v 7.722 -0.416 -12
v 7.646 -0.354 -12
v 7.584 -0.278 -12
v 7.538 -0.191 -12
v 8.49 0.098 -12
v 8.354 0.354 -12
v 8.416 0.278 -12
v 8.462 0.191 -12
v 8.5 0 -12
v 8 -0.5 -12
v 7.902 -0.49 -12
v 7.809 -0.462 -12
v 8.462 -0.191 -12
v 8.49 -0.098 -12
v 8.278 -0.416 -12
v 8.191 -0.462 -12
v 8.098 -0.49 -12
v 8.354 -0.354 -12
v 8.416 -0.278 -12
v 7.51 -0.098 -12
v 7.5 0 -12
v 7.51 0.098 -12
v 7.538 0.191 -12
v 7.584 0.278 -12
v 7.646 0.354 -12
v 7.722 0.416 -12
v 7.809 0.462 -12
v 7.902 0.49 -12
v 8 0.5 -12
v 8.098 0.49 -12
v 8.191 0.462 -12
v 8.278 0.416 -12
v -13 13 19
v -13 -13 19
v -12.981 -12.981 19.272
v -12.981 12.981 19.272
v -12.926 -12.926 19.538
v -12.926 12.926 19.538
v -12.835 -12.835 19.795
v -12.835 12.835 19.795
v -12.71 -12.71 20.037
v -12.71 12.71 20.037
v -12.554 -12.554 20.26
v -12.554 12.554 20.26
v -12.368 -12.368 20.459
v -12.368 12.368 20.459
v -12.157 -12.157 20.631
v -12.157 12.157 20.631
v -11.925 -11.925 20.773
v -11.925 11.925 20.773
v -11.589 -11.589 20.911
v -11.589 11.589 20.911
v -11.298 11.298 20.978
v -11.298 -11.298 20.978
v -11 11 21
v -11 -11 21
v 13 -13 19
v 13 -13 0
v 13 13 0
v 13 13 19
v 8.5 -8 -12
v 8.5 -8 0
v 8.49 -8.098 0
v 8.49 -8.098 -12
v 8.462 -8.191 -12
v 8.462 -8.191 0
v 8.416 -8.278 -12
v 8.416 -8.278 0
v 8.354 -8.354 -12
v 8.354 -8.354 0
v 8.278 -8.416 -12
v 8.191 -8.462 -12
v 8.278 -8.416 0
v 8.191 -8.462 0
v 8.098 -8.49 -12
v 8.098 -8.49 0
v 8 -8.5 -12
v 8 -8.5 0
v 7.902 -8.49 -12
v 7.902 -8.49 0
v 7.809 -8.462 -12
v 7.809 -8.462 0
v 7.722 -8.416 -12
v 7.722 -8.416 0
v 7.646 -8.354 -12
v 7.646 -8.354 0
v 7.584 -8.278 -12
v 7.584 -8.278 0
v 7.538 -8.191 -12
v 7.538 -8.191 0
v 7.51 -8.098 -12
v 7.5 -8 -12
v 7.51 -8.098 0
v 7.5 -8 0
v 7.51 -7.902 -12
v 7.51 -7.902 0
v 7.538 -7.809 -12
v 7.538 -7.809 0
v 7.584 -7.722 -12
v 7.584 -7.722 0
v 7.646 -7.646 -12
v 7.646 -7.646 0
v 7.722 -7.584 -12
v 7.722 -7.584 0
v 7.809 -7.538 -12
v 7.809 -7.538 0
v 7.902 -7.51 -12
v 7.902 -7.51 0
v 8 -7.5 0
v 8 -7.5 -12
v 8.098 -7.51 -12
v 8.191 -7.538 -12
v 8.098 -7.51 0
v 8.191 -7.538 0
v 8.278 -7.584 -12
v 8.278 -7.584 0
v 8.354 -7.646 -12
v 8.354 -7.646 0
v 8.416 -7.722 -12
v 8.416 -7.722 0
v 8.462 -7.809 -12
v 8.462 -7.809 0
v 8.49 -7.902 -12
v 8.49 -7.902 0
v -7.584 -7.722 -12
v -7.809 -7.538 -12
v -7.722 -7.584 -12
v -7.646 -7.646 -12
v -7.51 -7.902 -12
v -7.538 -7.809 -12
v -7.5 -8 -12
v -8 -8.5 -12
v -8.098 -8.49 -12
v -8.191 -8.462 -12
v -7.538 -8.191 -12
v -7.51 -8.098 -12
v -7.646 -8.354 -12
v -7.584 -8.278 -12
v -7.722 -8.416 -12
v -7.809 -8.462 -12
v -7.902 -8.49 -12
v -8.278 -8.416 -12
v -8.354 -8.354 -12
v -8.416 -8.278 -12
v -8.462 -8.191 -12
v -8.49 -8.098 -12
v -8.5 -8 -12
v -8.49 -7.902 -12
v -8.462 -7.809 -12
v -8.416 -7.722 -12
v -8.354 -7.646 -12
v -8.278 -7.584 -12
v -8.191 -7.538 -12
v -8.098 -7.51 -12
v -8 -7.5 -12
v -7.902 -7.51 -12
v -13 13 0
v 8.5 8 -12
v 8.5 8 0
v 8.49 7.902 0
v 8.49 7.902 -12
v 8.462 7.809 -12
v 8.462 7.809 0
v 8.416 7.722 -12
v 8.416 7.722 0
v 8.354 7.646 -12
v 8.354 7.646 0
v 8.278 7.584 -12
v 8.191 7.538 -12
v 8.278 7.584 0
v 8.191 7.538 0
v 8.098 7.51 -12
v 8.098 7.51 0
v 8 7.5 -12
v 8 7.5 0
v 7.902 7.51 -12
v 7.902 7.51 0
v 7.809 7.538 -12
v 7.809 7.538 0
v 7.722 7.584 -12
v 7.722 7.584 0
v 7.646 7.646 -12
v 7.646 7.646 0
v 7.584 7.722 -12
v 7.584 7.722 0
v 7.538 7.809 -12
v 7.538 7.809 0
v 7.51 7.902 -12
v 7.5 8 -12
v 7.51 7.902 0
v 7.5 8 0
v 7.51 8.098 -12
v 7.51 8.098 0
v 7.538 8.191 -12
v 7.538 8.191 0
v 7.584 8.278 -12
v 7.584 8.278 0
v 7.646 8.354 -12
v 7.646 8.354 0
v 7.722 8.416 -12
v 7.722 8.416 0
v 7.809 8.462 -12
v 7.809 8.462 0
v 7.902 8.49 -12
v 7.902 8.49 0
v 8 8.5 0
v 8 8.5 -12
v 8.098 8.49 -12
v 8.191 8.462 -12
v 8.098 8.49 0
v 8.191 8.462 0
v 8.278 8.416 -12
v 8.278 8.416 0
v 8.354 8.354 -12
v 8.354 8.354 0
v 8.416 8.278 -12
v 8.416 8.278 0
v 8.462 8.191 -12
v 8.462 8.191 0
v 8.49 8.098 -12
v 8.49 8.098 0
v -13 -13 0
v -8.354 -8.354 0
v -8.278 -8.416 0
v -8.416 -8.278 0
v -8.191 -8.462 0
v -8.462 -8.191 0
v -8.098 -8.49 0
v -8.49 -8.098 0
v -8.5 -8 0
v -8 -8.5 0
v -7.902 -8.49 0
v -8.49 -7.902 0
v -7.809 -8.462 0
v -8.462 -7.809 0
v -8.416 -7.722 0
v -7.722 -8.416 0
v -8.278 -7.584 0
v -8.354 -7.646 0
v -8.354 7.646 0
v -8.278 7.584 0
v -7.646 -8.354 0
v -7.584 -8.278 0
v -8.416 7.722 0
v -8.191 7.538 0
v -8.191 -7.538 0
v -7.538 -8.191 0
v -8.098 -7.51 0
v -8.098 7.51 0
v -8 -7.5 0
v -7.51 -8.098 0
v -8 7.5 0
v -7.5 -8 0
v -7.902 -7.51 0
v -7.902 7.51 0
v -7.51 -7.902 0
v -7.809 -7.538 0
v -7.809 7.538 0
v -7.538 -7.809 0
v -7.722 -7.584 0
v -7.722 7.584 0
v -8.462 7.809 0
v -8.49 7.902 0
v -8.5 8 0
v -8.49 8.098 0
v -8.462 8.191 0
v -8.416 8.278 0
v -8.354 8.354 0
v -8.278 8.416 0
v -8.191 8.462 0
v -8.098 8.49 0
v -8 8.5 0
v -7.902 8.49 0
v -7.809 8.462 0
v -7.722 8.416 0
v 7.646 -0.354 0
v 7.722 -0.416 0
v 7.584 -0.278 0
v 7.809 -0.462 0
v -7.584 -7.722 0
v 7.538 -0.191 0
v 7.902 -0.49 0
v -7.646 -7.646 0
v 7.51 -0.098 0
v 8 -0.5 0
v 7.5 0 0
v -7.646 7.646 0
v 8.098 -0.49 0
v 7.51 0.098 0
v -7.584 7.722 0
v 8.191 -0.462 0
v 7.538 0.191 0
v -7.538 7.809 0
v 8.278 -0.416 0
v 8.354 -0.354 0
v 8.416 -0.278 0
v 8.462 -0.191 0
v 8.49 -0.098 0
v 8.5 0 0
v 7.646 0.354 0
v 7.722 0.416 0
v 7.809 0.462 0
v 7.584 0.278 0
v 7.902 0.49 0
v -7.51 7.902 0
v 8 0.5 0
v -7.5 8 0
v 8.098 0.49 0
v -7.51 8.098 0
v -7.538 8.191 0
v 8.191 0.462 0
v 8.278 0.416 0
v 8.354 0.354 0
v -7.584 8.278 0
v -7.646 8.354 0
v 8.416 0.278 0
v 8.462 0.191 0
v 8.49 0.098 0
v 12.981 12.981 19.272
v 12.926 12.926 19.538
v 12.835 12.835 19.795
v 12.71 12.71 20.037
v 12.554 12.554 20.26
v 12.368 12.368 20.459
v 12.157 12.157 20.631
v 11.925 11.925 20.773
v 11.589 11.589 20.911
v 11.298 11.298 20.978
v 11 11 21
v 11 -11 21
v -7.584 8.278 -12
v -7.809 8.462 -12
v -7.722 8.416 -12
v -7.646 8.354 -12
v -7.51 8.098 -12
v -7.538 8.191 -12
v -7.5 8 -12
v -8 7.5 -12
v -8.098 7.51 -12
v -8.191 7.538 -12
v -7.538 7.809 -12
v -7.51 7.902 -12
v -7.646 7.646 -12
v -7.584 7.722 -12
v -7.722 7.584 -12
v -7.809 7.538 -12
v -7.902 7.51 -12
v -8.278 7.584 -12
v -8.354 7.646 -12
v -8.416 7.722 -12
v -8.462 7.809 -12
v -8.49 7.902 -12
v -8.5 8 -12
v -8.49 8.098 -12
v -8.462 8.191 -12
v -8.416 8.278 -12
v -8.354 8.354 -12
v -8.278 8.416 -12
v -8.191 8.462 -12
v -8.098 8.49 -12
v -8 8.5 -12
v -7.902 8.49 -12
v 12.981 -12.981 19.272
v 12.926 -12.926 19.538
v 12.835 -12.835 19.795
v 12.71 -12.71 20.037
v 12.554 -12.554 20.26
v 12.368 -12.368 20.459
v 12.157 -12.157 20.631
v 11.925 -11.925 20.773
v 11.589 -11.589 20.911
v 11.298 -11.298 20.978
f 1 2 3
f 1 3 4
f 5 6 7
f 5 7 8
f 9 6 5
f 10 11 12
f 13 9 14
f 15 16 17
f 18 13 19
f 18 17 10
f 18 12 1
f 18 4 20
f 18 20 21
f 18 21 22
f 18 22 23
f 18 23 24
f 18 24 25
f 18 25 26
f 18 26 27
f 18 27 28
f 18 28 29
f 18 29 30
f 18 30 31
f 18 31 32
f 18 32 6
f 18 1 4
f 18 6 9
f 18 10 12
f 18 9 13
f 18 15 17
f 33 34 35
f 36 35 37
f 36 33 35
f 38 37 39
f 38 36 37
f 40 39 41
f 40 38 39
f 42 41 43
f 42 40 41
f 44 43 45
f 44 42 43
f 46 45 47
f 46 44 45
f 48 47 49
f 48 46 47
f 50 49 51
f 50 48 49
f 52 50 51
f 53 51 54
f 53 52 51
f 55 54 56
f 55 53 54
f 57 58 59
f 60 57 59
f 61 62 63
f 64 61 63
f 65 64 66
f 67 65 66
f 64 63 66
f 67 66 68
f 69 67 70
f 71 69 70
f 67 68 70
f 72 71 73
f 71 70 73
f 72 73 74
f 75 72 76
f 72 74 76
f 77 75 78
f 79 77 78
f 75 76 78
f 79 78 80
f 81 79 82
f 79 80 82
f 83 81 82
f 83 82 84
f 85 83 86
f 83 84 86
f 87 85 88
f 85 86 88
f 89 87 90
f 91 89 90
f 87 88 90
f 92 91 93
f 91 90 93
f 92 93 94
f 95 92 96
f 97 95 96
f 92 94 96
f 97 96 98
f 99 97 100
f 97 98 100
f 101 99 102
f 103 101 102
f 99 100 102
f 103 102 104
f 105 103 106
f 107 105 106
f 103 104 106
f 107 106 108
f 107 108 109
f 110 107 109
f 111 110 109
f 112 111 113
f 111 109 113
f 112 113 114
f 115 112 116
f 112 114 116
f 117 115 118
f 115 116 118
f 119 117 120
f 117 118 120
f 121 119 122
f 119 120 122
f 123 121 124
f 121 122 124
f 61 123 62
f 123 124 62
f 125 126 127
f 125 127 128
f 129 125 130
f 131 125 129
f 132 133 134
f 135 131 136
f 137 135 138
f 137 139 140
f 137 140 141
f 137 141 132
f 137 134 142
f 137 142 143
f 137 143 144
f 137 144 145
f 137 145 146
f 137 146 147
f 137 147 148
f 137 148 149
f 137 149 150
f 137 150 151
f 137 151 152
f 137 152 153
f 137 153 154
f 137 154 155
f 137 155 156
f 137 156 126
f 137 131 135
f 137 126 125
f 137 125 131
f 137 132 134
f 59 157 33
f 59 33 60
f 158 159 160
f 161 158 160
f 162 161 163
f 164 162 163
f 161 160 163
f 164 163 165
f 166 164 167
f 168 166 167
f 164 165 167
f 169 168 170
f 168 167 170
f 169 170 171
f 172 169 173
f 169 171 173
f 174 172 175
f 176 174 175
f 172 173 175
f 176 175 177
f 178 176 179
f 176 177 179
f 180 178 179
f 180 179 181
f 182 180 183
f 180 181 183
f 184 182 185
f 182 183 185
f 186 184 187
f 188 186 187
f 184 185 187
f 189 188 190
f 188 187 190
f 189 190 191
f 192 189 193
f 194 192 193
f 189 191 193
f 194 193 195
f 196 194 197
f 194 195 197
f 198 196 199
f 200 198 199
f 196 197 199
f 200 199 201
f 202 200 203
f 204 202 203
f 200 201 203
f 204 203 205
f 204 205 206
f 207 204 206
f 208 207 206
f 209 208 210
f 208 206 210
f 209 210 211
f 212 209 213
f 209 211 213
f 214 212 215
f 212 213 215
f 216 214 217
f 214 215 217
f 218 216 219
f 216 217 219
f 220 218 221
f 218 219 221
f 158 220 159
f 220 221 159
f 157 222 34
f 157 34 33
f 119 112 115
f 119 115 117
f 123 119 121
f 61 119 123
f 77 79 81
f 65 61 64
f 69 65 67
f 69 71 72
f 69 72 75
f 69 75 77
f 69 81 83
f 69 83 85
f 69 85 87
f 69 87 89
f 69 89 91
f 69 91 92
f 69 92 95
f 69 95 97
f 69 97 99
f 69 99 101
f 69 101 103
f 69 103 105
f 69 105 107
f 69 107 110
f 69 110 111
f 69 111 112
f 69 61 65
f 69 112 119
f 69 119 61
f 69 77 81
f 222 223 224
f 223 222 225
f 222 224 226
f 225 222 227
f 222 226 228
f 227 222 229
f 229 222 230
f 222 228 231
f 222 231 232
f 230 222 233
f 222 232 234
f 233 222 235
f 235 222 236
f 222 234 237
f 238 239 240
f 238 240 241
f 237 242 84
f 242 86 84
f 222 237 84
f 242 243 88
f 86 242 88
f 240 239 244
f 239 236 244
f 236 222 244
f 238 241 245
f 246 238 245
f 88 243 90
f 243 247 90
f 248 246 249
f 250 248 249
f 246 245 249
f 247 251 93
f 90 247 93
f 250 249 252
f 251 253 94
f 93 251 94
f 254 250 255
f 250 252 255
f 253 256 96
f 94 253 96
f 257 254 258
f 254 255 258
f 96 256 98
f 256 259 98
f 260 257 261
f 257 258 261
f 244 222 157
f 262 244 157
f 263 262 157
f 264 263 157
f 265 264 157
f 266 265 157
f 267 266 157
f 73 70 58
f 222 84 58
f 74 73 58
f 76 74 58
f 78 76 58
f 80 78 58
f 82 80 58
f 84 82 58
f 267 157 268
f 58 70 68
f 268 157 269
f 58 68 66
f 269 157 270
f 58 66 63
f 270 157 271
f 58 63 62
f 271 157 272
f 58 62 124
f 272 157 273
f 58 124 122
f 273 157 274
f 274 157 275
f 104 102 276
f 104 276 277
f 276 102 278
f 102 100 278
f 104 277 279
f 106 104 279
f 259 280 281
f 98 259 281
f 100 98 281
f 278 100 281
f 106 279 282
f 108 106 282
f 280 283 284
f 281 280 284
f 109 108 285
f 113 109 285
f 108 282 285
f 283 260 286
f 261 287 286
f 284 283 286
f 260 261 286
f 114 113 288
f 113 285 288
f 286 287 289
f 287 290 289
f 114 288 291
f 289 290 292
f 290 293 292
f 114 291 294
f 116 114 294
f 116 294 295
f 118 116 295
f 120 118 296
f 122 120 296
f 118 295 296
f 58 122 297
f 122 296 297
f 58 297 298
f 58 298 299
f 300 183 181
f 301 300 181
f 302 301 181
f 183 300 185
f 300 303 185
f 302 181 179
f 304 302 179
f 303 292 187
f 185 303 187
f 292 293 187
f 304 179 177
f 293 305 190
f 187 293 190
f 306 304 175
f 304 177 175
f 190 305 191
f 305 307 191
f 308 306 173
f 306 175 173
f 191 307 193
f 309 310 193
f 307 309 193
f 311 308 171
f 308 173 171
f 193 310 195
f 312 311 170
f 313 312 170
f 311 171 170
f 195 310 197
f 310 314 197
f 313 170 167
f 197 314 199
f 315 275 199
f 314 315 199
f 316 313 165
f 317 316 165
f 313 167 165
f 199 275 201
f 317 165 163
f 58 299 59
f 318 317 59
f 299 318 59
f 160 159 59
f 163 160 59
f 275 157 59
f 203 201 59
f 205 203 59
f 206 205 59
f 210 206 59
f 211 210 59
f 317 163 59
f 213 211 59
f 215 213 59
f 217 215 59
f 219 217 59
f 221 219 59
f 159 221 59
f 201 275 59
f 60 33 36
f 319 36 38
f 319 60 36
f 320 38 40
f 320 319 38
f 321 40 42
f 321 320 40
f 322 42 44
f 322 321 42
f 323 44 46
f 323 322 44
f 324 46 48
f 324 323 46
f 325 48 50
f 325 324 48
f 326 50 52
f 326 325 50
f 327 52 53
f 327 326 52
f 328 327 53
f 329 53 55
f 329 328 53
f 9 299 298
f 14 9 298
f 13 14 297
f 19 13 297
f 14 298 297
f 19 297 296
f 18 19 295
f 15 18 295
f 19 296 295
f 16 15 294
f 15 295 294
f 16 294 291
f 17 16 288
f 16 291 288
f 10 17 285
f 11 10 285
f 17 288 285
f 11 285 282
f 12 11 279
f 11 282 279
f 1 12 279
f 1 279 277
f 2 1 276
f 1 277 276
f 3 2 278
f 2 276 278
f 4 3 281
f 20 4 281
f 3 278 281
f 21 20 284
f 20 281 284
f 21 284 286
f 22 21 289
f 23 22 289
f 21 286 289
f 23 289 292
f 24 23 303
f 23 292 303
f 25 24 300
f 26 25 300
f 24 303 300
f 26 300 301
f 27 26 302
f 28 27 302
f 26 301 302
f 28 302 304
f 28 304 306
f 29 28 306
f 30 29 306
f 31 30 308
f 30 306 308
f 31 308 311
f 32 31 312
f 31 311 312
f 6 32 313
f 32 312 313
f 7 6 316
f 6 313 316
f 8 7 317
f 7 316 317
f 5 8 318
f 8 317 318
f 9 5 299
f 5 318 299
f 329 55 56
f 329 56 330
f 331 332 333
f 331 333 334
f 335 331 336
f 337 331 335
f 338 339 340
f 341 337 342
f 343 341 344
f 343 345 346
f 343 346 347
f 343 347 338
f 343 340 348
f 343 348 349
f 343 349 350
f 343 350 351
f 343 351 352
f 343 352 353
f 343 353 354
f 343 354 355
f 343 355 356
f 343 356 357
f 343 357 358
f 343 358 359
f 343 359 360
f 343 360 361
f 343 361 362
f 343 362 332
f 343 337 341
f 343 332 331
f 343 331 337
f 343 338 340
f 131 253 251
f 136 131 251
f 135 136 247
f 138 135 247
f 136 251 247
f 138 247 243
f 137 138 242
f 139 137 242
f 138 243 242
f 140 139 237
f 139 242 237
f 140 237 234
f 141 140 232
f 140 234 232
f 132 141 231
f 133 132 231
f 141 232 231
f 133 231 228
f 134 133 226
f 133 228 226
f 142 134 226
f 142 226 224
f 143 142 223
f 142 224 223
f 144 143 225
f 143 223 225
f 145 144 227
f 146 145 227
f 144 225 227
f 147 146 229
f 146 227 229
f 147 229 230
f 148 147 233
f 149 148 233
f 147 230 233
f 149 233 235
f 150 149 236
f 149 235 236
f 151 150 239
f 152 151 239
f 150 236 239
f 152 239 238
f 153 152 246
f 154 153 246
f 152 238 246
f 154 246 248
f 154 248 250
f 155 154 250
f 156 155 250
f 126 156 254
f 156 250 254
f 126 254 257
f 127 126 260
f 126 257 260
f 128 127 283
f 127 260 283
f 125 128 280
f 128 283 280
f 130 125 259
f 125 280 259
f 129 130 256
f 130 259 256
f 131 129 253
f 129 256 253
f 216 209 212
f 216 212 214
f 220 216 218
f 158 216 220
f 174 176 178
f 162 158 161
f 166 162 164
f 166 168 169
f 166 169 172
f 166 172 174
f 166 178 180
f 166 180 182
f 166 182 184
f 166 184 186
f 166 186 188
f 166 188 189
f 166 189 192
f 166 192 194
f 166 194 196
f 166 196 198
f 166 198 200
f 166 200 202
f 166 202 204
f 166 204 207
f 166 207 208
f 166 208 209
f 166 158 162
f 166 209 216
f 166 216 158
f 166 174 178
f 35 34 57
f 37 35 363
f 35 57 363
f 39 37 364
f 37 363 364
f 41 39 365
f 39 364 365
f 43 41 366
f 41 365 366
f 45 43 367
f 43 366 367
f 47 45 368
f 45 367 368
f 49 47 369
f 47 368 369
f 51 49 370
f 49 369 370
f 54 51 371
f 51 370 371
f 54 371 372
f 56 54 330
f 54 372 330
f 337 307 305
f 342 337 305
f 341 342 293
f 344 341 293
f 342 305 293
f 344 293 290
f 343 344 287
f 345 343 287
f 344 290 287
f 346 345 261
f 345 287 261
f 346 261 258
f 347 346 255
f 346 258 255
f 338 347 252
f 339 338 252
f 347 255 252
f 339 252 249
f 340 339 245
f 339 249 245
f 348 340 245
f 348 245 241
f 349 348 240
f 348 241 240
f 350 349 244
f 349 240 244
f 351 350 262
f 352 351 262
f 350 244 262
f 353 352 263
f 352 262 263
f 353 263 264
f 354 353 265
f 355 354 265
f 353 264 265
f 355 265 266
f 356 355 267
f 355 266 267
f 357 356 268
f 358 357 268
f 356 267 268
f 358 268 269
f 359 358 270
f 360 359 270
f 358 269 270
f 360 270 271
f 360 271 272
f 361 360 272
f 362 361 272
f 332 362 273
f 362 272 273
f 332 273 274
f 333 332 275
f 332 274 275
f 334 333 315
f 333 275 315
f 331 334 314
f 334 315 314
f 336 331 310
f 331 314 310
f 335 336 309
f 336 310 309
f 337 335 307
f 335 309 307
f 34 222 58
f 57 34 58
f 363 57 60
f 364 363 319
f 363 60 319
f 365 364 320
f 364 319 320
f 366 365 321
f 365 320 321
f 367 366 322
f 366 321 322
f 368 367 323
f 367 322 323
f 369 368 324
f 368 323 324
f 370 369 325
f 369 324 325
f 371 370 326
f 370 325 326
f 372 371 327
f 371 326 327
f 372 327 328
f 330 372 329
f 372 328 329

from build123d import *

# Parameters (mm, degrees)
SKETCH_1_W      = 26
SKETCH_1_H      = 26
EXTRUDE_1_DEPTH = 21
FILLET_1_R      = 2
SKETCH_2_R      = 0.5
EXTRUDE_2_DEPTH = 12


with BuildPart() as part:
    # 草图1 → 凸台-拉伸1 (new body)
    with BuildSketch(Plane.XY):
        Rectangle(SKETCH_1_W, SKETCH_1_H)
    extrude(amount=EXTRUDE_1_DEPTH)

    # 圆角1
    fillet_1_edges = [part.edges().sort_by_distance(p)[0] for p in [
        (13, 0, 21),
        (0, 13, 21),
        (-13, 0, 21),
        (0, -13, 21),
    ]]
    fillet(fillet_1_edges, radius=FILLET_1_R)

    # 草图2 → 凸台-拉伸2 (add)
    with BuildSketch(Plane(origin=(0, 0, 0), x_dir=(-1, 0, 0), z_dir=(0, 0, -1))):
        with Locations(Location((-8, 8, 0), (0, 0, 180))):
            Circle(SKETCH_2_R)
        with Locations(Location((-8, 0, 0), (0, 0, 180))):
            Circle(SKETCH_2_R)
        with Locations(Location((-8, -8, 0), (0, 0, 180))):
            Circle(SKETCH_2_R)
        with Locations(Location((8, -8, 0), (0, 0, 180))):
            Circle(SKETCH_2_R)
        with Locations(Location((8, 8, 0), (0, 0, 180))):
            Circle(SKETCH_2_R)
    extrude(amount=EXTRUDE_2_DEPTH)


solid = part.part
